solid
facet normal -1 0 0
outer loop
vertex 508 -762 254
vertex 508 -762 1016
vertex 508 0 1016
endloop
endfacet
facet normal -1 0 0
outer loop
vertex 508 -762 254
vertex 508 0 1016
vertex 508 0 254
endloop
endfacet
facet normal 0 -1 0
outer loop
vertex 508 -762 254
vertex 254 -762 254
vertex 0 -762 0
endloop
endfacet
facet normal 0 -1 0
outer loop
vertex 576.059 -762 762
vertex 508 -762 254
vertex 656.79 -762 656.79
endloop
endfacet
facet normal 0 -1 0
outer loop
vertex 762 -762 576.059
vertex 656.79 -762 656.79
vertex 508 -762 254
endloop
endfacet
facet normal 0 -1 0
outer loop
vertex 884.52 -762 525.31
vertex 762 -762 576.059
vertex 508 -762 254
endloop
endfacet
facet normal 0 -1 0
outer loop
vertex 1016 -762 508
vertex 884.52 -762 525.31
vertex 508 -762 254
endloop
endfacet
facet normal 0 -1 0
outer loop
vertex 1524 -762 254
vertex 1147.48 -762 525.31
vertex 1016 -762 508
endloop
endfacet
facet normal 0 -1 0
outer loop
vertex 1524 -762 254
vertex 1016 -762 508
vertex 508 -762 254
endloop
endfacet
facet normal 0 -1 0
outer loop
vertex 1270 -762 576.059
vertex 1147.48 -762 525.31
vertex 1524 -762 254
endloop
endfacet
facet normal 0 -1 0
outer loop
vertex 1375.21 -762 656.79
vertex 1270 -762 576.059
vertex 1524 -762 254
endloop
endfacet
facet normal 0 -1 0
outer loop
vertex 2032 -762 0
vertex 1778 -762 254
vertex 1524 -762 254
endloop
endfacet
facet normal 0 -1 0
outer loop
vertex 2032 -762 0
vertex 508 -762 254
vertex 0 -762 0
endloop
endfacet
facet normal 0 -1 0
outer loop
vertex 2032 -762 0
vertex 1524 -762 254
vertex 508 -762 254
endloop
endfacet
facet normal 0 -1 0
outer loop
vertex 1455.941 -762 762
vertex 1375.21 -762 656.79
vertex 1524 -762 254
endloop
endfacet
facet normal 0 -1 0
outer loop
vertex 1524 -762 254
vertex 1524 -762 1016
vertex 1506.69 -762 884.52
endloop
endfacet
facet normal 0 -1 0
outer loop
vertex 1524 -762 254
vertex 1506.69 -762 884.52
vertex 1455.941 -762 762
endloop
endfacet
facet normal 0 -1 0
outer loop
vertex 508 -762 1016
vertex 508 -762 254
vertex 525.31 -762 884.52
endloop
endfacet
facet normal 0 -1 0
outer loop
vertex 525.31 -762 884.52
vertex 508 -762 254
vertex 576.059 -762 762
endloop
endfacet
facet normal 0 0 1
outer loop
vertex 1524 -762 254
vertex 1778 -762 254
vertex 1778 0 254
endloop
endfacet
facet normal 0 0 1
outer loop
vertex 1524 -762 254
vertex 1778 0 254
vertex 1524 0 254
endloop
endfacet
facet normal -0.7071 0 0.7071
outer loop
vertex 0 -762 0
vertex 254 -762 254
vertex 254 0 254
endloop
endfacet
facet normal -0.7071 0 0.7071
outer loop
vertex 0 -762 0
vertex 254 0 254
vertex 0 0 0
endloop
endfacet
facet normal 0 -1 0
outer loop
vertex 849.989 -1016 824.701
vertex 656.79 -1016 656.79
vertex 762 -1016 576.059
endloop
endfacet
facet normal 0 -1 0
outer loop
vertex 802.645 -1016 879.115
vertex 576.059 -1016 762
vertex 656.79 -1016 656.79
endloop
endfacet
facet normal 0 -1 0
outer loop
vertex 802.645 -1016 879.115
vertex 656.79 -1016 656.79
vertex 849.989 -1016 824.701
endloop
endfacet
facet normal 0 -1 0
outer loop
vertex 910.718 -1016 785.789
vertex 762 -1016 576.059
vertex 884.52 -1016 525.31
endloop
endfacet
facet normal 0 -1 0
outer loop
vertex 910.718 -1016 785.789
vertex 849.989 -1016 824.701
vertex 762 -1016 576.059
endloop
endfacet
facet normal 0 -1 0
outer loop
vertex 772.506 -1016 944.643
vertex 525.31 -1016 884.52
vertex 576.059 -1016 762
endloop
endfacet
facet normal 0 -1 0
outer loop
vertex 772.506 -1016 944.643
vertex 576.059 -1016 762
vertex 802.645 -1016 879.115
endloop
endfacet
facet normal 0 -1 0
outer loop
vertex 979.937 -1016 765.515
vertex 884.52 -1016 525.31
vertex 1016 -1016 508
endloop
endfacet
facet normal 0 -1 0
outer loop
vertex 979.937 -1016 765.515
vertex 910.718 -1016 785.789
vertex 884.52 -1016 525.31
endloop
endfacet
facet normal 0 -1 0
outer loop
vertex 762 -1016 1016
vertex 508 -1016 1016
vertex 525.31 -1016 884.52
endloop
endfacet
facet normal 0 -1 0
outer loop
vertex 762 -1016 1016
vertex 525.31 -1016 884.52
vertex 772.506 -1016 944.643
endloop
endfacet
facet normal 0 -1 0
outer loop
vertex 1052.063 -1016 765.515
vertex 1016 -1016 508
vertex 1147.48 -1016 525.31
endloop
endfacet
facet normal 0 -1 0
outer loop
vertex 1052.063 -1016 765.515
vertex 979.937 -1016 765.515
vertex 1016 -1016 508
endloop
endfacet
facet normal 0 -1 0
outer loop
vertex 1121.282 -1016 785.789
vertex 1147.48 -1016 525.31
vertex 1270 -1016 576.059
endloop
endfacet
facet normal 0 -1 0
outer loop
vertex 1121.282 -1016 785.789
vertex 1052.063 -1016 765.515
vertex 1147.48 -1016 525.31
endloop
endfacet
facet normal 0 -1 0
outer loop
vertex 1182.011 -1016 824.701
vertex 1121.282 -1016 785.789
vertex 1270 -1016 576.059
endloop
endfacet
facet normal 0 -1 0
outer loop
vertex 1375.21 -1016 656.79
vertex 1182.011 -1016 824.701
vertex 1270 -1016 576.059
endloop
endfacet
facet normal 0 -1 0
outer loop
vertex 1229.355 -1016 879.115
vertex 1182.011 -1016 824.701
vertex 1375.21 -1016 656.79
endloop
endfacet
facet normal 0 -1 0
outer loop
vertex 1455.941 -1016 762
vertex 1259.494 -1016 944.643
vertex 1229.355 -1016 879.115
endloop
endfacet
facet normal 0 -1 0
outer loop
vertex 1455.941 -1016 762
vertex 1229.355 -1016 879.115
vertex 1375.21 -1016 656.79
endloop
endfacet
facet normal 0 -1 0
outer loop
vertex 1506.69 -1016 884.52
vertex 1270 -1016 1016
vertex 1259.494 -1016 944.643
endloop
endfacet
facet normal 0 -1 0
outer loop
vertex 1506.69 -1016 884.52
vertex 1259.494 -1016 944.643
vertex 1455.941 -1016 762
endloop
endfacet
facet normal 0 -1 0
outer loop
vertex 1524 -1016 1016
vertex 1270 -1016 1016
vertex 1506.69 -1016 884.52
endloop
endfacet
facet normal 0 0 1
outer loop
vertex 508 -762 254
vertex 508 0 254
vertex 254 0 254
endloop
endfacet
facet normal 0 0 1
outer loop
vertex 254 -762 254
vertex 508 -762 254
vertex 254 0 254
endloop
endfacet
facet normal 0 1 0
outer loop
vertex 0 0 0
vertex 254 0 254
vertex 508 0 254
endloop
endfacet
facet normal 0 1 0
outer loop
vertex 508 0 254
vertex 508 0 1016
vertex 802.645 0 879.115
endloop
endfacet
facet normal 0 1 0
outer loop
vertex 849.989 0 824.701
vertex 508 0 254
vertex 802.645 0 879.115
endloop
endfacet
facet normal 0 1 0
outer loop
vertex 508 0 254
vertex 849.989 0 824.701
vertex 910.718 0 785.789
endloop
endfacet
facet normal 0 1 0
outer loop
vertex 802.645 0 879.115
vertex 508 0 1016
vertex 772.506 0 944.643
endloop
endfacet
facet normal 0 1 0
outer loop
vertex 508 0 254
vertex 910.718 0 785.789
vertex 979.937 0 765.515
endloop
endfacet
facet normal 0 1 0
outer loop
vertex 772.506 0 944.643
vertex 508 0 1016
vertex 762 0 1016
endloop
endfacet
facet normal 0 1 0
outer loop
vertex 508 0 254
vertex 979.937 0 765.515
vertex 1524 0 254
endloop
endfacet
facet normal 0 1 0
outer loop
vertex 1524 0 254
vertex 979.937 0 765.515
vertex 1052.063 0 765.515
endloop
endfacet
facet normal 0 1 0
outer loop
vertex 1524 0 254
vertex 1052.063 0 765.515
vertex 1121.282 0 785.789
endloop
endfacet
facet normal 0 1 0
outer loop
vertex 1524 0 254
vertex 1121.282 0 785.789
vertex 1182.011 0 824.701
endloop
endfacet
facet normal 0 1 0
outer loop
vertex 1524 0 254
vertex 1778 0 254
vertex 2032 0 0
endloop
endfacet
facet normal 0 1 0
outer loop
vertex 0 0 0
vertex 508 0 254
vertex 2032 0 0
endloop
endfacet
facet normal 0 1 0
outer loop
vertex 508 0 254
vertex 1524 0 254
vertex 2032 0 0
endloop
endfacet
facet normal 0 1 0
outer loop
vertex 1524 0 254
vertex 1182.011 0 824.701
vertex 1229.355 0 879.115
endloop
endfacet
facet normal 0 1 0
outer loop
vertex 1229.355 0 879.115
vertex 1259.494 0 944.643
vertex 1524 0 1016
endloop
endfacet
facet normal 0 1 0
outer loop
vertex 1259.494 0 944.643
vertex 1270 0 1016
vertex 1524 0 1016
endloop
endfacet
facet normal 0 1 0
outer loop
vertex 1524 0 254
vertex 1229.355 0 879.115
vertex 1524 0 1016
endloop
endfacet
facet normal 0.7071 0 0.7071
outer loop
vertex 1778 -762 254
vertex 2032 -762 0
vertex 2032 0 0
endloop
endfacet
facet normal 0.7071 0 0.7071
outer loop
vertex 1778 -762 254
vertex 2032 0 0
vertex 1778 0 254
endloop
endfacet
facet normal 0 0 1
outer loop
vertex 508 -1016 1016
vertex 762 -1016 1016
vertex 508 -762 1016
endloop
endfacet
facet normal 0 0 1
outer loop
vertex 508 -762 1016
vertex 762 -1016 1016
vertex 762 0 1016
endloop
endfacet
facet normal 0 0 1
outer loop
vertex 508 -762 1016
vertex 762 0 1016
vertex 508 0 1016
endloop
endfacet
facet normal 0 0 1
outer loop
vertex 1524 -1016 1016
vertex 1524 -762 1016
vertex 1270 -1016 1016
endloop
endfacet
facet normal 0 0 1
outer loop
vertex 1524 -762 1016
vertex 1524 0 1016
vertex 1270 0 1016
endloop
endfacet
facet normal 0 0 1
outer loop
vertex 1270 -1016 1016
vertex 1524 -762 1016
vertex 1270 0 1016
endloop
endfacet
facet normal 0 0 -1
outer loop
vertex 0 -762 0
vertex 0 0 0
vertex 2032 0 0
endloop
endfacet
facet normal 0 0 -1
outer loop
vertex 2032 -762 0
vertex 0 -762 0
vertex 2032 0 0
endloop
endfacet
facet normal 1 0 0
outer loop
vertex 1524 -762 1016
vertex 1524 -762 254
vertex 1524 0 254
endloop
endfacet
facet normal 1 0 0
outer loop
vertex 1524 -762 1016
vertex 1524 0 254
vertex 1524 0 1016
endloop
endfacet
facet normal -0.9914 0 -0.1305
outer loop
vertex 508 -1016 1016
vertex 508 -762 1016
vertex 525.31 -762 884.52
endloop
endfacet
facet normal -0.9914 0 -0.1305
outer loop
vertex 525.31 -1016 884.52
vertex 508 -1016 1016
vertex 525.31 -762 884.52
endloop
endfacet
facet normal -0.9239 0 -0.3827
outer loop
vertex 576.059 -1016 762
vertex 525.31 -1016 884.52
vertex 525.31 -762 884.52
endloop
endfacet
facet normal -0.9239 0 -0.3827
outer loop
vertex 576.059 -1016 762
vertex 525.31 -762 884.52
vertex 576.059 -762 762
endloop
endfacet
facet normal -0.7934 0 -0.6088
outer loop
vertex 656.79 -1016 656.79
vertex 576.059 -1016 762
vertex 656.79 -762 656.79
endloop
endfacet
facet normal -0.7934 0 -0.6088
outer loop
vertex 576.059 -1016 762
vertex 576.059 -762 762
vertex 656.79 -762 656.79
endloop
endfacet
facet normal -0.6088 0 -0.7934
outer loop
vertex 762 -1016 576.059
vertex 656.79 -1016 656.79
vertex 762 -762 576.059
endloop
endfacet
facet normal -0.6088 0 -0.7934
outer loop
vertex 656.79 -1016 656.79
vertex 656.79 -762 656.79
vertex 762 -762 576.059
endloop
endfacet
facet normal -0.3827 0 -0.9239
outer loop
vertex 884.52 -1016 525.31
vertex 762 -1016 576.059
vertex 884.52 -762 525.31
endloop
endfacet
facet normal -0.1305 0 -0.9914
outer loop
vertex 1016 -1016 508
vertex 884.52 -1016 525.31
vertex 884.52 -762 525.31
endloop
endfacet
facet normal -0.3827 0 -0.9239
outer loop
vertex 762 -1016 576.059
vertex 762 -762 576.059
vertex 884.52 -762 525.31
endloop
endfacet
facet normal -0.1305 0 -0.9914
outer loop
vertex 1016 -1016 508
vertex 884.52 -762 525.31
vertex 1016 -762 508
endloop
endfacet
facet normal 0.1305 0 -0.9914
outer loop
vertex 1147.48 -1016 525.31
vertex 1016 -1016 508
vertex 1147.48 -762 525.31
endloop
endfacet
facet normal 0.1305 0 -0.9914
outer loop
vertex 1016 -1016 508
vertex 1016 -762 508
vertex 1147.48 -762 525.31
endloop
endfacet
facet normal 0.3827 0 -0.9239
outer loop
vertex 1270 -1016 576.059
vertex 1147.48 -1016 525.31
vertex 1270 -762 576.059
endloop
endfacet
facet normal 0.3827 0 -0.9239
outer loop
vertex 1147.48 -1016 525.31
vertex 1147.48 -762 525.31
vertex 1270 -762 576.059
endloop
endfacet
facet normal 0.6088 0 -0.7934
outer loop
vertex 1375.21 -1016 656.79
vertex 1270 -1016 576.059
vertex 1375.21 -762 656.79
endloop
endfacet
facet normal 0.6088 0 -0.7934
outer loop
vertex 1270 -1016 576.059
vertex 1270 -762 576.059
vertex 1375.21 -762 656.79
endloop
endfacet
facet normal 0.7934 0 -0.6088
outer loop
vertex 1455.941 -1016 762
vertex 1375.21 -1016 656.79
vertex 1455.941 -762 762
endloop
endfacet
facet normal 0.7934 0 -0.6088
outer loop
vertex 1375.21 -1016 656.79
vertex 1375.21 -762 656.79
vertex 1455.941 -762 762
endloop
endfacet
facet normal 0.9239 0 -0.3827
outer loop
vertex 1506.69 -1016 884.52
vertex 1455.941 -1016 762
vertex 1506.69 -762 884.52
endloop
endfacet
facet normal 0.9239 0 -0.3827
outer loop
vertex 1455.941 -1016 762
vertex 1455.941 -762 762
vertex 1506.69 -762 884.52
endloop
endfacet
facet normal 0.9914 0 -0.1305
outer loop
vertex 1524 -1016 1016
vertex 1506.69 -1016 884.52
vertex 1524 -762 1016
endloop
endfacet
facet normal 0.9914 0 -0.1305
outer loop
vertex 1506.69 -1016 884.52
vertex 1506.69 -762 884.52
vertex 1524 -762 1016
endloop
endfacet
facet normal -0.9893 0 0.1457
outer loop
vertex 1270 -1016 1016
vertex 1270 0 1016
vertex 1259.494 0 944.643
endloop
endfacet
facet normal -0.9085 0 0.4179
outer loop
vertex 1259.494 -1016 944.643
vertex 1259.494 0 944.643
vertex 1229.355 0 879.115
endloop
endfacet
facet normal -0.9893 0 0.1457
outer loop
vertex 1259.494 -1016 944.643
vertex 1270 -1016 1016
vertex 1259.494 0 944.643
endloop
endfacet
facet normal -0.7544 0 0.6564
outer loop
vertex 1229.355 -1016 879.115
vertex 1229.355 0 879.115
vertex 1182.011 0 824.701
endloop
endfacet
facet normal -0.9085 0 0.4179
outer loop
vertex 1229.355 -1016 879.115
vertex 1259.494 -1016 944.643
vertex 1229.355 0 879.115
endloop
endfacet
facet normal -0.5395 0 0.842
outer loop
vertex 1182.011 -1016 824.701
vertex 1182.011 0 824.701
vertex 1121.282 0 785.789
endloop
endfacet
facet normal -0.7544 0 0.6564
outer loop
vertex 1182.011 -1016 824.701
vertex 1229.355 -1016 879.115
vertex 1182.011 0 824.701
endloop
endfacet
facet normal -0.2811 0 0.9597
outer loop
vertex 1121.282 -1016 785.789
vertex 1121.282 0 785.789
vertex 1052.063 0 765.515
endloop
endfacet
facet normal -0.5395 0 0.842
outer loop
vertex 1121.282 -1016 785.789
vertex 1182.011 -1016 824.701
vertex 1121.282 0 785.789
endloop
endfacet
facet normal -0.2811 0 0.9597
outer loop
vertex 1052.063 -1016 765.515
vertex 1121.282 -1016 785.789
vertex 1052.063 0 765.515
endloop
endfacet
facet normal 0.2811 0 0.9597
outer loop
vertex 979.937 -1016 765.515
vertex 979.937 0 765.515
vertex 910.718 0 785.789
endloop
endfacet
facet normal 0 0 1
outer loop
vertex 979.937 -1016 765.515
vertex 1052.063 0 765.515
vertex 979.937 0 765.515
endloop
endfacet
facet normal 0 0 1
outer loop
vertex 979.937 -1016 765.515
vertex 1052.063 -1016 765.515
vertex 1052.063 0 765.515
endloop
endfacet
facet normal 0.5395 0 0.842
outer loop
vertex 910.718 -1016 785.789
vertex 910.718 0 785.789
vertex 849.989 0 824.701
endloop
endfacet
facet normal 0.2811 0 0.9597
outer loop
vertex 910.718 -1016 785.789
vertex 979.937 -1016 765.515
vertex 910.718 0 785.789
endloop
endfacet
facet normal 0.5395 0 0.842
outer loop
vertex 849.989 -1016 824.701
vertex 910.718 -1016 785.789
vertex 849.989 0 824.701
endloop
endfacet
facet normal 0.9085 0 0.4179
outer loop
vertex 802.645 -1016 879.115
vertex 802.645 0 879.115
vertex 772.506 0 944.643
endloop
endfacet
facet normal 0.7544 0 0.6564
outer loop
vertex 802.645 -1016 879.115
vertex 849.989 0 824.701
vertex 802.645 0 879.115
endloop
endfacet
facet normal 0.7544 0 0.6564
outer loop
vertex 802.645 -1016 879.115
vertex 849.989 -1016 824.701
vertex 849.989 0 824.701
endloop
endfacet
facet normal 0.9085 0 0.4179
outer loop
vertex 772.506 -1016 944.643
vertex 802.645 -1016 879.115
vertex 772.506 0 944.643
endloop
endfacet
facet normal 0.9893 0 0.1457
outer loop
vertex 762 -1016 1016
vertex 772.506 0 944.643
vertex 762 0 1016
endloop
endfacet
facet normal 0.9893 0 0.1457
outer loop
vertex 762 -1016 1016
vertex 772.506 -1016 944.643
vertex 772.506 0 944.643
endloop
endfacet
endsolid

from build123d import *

# Parameters (mm, degrees)
F1_DEPTH = 762
F3_DEPTH = 254
F4_DEPTH = 1143


with BuildPart() as f1:
    # F0 (on Front) → F1 (new body)
    with BuildSketch(Plane.XZ):
        Polygon((254, 254), (0, 0), (2032, 0), (1778, 254), (1524, 254), (1524, 1016), (508, 1016), (508, 254), align=None)
    extrude(amount=F1_DEPTH)

    # F2 (on face) → F3 (join)
    with BuildSketch(Plane.XZ.offset(762)):
        with BuildLine():
            Line((762, 1016), (508, 1016))
            ThreePointArc((508, 1016), (1016, 508), (1524, 1016))
            Line((1524, 1016), (1270, 1016))
            ThreePointArc((1270, 1016), (1016, 762.9418953538), (762, 1016))
        make_face()
    extrude(amount=F3_DEPTH)

    # F4 (cut): a face of the model
    f4_faces = [f1.faces().sort_by_distance(p)[0] for p in [
        (1016, -762, 908.631847947),
    ]]
    extrude(f4_faces, amount=-F4_DEPTH, mode=Mode.SUBTRACT)


solid = f1.part
